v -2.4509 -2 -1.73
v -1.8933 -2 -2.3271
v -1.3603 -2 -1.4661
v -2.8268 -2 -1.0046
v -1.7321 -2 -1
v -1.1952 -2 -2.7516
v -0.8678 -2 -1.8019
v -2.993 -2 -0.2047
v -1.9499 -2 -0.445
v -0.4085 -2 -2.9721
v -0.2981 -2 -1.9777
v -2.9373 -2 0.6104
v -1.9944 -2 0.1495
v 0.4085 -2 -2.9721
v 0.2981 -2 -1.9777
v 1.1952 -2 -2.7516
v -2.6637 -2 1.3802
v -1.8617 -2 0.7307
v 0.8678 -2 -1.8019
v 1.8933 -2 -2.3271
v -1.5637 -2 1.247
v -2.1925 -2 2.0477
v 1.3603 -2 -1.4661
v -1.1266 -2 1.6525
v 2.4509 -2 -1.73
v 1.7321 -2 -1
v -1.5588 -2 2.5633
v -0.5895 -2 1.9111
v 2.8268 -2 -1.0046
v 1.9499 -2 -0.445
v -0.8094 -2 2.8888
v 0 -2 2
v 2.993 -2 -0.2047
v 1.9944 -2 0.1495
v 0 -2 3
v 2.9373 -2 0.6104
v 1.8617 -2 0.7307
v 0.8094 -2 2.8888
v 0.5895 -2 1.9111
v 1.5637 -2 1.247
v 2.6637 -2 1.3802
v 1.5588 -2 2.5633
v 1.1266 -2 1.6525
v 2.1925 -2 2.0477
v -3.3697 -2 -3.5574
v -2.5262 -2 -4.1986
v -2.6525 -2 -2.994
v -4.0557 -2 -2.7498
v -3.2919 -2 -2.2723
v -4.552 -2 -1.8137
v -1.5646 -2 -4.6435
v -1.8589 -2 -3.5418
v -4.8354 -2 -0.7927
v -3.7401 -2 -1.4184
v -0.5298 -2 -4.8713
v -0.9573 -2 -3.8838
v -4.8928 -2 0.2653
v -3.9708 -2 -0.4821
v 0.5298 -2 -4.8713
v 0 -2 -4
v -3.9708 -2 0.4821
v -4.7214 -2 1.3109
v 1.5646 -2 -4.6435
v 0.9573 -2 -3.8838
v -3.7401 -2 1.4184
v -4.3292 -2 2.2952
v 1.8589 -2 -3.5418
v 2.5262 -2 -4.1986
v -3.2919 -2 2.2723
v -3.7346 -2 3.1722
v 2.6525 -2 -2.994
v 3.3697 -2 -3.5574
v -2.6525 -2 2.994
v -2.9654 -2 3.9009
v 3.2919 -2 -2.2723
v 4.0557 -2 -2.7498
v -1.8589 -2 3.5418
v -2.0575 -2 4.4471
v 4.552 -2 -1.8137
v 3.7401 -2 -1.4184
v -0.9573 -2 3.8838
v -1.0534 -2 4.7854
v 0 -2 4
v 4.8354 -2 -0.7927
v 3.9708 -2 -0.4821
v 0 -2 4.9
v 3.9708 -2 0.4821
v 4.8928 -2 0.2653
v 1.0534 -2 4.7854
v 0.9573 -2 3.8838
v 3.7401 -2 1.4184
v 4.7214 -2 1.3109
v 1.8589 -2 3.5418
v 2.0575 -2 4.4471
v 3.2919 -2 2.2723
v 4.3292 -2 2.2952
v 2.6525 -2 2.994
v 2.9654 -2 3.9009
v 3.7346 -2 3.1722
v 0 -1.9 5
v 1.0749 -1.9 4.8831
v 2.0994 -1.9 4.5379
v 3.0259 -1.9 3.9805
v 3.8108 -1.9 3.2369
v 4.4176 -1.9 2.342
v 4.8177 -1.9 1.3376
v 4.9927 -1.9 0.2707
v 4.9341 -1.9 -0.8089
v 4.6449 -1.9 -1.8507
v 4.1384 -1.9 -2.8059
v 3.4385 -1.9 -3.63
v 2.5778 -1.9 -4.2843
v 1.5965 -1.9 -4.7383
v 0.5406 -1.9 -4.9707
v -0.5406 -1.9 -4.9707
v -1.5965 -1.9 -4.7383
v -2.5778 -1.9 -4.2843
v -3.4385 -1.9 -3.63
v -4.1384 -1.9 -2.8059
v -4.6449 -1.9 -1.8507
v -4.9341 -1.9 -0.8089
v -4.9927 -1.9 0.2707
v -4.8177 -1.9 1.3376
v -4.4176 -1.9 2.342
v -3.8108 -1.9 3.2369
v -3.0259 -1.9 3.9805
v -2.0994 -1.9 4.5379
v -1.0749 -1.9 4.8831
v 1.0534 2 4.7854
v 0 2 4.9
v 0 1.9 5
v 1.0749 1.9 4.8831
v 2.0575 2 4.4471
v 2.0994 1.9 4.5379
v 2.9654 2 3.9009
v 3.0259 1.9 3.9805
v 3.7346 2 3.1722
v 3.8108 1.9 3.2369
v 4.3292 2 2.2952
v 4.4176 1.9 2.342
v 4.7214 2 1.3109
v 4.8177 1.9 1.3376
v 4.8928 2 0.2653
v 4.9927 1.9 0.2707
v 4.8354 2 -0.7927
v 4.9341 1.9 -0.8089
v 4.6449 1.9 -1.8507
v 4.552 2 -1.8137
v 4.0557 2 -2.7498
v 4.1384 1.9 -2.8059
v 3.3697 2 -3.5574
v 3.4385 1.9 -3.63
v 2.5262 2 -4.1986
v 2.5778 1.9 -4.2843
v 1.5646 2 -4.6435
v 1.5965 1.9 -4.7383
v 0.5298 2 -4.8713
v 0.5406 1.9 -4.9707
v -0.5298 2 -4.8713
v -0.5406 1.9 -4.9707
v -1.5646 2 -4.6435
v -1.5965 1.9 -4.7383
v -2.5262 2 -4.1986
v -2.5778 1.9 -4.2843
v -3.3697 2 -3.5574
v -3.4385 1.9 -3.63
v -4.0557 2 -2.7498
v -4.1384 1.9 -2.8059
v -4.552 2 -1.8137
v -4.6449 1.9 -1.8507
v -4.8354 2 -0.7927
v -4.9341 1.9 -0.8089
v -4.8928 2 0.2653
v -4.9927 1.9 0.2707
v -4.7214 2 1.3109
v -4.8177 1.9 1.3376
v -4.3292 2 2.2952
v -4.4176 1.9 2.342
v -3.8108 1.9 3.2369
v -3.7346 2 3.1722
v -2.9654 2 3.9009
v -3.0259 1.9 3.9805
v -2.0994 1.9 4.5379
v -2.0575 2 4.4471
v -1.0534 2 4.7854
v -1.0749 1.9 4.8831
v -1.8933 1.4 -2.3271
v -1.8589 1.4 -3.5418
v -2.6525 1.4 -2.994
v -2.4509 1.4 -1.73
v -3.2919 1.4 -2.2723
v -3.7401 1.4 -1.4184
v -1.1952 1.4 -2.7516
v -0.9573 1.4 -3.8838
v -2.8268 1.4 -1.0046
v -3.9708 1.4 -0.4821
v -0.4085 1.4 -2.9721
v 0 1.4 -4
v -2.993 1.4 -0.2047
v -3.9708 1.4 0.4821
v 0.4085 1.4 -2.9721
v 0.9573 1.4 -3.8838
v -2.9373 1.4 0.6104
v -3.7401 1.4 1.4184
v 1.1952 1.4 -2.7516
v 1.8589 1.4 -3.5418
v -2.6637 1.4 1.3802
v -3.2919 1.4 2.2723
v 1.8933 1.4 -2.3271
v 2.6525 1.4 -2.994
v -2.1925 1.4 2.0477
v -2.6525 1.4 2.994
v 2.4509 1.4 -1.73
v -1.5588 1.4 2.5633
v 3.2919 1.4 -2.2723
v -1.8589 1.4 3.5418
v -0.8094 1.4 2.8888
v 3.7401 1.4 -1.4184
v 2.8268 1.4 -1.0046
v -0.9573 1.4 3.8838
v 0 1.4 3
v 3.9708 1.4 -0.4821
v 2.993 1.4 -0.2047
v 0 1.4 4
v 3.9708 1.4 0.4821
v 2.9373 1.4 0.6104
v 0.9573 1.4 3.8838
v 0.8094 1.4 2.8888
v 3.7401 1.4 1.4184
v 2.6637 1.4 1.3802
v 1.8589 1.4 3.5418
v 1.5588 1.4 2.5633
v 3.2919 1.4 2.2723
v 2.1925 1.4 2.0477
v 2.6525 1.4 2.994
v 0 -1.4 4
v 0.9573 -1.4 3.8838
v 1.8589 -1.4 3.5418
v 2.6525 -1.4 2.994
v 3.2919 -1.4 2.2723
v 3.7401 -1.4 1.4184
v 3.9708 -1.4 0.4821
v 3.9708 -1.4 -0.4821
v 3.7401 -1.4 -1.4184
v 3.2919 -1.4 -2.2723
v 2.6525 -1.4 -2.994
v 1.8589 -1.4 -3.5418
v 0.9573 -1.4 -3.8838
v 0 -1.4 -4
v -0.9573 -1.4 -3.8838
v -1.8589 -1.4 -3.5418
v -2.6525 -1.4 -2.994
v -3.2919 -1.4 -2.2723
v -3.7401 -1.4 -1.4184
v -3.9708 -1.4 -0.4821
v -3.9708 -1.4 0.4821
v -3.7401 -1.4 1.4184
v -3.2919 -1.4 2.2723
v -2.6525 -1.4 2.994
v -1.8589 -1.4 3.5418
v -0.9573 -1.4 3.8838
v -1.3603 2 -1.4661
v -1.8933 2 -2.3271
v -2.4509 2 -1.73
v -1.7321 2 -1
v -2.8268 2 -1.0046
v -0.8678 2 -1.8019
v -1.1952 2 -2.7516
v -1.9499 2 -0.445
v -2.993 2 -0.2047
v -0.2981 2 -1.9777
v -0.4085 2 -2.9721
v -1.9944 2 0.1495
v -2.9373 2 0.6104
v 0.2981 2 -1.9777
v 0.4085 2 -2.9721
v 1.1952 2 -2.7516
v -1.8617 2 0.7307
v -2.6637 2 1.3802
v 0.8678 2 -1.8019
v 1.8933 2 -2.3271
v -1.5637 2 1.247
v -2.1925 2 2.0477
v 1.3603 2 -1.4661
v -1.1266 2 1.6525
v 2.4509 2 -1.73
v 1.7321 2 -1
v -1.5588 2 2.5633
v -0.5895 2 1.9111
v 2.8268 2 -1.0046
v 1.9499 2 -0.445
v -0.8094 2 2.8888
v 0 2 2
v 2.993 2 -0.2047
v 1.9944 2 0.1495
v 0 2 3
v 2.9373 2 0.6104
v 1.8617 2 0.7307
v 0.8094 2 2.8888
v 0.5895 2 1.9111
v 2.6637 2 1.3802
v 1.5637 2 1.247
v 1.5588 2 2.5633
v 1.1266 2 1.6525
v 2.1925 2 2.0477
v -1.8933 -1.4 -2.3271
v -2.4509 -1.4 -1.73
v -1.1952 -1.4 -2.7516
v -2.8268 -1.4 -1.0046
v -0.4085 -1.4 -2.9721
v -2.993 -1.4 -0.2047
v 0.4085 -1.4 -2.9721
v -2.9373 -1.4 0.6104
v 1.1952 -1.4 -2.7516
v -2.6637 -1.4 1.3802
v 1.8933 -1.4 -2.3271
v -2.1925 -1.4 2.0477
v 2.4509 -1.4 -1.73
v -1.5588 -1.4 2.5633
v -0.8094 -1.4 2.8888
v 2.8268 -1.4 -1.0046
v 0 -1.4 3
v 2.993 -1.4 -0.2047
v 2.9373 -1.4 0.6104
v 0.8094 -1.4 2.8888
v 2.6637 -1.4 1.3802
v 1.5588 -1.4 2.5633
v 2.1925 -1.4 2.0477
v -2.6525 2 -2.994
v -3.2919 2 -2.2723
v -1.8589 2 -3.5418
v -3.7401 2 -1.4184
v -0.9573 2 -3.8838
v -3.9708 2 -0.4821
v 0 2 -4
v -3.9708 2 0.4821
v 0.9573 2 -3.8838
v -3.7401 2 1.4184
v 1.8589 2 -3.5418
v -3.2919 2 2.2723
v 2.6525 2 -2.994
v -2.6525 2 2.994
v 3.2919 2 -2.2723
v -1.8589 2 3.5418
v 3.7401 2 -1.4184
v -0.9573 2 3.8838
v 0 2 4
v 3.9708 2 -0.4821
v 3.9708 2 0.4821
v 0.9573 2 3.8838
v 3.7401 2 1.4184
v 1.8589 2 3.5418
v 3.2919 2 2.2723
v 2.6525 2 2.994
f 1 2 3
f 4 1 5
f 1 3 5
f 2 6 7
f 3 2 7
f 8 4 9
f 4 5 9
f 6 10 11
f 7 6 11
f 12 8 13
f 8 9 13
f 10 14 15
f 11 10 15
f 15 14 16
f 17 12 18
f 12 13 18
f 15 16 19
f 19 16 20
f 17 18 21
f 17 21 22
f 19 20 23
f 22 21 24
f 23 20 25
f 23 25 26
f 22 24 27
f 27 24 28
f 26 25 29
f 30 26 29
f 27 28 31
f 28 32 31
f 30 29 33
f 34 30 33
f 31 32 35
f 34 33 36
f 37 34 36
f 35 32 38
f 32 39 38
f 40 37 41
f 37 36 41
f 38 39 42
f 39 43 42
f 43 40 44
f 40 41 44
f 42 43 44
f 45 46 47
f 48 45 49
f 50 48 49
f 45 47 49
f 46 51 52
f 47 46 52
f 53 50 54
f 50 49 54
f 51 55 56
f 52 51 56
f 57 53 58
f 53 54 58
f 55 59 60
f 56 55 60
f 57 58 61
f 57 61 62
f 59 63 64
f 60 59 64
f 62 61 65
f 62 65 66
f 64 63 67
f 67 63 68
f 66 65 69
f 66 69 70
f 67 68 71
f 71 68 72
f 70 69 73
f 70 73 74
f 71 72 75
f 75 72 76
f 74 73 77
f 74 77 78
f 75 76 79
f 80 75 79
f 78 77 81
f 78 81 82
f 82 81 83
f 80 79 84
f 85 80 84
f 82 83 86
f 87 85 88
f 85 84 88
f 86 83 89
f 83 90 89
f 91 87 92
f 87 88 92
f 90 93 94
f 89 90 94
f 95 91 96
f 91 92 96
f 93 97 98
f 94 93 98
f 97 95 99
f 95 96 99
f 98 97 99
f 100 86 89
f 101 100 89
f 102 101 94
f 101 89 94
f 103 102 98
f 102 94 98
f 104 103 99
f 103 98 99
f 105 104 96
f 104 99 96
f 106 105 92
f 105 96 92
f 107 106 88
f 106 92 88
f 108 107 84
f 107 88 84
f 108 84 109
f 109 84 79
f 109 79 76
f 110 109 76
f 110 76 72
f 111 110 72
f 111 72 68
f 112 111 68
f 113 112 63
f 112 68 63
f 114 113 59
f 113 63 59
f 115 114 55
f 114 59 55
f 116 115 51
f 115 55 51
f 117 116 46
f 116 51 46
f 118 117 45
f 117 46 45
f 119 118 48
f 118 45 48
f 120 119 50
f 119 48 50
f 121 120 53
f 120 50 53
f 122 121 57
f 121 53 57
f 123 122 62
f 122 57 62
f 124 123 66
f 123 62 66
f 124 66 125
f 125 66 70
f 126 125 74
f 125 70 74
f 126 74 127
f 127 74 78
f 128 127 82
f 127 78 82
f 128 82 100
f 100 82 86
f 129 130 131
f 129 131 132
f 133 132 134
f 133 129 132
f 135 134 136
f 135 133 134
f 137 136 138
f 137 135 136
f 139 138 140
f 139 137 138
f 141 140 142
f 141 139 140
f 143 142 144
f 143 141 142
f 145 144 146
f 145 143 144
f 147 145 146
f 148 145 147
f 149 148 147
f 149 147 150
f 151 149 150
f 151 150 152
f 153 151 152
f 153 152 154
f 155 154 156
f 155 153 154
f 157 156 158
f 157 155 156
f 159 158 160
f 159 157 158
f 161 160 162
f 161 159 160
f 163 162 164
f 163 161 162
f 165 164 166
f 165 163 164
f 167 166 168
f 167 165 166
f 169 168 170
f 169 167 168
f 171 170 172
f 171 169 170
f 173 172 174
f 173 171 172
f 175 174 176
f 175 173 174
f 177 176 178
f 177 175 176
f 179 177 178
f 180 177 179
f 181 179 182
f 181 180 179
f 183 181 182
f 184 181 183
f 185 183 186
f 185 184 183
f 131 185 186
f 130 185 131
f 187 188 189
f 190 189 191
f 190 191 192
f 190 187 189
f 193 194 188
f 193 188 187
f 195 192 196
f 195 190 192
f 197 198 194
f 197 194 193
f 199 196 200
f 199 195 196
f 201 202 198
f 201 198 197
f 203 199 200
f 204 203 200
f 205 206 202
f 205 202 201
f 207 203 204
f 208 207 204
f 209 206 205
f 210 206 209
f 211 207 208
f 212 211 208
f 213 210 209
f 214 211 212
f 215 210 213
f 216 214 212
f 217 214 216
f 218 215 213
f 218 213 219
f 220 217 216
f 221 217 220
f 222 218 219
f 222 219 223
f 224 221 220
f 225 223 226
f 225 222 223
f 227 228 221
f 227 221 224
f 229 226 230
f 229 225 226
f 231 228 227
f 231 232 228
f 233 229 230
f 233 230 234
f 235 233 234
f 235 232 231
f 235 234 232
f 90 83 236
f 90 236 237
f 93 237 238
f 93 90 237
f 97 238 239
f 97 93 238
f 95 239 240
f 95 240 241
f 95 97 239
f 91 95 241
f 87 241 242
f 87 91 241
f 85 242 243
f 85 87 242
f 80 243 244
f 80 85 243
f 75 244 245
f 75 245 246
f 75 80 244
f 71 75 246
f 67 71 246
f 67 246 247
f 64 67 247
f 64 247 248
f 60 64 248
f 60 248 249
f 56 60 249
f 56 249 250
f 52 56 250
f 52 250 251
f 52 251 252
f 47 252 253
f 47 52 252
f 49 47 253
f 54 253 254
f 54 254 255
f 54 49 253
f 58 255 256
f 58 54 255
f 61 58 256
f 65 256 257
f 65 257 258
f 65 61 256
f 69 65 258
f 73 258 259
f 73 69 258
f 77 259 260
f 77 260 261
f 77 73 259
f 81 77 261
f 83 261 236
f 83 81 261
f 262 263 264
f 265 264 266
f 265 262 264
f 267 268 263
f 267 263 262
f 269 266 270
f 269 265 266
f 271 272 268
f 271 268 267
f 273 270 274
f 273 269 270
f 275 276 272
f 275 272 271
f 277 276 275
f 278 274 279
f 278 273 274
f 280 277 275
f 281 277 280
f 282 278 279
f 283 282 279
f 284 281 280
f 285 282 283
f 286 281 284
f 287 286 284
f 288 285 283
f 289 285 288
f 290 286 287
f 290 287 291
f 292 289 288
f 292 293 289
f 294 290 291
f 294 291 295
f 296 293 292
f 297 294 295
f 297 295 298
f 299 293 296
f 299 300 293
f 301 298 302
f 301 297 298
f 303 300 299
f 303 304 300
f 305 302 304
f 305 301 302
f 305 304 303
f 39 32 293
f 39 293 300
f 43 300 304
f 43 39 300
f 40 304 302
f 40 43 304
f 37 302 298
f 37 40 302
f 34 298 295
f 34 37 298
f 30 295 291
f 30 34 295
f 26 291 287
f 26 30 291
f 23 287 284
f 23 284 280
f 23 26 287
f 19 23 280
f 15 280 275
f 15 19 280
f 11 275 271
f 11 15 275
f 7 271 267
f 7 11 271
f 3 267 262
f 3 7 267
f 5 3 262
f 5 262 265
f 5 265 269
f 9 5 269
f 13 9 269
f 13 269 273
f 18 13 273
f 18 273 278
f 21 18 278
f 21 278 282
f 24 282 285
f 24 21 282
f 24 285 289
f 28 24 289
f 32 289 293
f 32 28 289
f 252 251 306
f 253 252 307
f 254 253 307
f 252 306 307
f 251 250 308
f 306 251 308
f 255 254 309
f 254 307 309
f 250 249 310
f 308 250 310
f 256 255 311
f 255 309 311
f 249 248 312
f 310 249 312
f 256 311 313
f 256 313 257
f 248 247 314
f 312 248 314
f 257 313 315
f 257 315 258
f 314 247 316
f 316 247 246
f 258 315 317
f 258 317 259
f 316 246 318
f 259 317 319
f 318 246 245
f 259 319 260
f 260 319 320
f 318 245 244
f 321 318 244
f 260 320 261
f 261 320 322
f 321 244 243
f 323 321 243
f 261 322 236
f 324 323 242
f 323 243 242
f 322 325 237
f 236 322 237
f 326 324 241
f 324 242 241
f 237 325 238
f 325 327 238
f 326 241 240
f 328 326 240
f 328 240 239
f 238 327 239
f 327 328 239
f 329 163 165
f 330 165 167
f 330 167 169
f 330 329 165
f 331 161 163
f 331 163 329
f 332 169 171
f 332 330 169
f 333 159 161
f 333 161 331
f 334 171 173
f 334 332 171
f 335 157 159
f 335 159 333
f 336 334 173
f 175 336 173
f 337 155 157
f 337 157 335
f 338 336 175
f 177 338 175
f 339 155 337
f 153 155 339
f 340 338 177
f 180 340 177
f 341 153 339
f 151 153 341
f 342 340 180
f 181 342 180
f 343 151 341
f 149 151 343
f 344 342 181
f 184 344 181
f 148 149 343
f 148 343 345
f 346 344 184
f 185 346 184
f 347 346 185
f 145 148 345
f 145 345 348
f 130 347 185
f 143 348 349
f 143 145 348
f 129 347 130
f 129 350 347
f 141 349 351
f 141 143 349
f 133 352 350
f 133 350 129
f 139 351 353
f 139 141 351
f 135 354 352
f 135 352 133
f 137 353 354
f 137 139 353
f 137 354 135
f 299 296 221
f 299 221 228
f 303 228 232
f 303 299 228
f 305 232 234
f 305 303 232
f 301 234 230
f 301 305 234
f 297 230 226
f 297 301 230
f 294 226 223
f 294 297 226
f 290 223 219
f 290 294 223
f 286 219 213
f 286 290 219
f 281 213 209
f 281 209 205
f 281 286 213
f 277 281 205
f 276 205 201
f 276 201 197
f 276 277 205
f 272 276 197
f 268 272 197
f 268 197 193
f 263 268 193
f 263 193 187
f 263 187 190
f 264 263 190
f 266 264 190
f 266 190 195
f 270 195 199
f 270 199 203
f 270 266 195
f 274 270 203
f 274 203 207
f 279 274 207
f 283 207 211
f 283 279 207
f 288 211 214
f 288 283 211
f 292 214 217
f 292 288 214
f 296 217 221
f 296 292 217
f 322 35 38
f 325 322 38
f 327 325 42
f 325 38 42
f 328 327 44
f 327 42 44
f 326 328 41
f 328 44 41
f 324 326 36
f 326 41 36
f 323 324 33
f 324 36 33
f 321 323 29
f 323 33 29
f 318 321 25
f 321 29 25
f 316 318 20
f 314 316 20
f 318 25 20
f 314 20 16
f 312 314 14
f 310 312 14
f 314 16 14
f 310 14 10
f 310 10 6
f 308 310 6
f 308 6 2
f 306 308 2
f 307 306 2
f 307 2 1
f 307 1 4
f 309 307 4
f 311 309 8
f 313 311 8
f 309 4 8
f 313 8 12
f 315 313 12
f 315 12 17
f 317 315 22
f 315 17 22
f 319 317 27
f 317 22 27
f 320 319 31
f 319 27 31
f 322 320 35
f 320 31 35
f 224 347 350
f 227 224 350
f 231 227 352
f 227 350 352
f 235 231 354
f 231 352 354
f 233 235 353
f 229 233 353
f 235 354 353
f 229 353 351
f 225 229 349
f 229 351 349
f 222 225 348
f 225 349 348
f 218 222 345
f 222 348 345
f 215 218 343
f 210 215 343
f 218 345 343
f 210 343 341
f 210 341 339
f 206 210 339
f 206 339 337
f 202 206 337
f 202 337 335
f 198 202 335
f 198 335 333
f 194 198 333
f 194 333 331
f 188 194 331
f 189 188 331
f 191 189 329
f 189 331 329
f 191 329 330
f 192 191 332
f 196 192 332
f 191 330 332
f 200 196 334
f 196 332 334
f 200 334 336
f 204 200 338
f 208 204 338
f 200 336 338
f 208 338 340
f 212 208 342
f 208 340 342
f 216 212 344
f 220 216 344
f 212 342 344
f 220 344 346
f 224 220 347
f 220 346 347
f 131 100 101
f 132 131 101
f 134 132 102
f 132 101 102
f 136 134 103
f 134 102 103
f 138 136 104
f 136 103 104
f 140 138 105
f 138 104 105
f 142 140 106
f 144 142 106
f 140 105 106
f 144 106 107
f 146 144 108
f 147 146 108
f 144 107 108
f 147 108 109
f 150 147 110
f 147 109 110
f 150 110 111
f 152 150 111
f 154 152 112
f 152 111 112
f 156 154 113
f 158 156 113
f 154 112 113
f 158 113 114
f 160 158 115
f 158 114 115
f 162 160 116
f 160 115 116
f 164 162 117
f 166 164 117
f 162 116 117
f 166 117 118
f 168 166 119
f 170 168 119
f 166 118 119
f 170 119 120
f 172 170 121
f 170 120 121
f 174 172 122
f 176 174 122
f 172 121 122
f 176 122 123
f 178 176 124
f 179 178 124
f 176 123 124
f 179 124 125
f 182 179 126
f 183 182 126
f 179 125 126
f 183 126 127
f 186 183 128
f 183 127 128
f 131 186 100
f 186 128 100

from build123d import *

# Parameters (mm, degrees)
BOSS_EXTRUDE1_DEPTH      = 2
BOSS_EXTRUDE1_DEPTH_BACK = 2
SKETCH1_R                = 5
SKETCH1_R_2              = 2
SKETCH2_R                = 4
SKETCH2_R_2              = 3
CUT_EXTRUDE1_DEPTH       = 0.6
CHAMFER1_SIZE            = 0.1


with BuildPart() as part:
    # Sketch1 → Boss-Extrude1 (new, two sides: drawn at the far end of the back side and taken through both)
    with BuildSketch(Plane(origin=(0, 0, 0), x_dir=(1, 0, 0), z_dir=(0, 1, 0)).offset(-BOSS_EXTRUDE1_DEPTH_BACK)):
        Circle(SKETCH1_R)
        Circle(SKETCH1_R_2, mode=Mode.SUBTRACT)
    extrude(amount=BOSS_EXTRUDE1_DEPTH + BOSS_EXTRUDE1_DEPTH_BACK)

    # Sketch2 → Cut-Extrude1 (cut)
    with BuildSketch(Plane(origin=(0, 2, 0), x_dir=(1, 0, 0), z_dir=(0, 1, 0))):
        Circle(SKETCH2_R)
        Circle(SKETCH2_R_2, mode=Mode.SUBTRACT)
    cut_extrude1 = extrude(amount=-CUT_EXTRUDE1_DEPTH, mode=Mode.SUBTRACT)

    # Mirror2: Cut-Extrude1 across plane
    add(cut_extrude1.mirror(Plane.ZX), mode=Mode.SUBTRACT)

    # Chamfer1
    chamfer1_edges = [part.edges().sort_by_distance(p)[0] for p in [
        (-5, -2, 0),
        (-5, 2, 0),
    ]]
    chamfer(chamfer1_edges, length=CHAMFER1_SIZE)


solid = part.part
